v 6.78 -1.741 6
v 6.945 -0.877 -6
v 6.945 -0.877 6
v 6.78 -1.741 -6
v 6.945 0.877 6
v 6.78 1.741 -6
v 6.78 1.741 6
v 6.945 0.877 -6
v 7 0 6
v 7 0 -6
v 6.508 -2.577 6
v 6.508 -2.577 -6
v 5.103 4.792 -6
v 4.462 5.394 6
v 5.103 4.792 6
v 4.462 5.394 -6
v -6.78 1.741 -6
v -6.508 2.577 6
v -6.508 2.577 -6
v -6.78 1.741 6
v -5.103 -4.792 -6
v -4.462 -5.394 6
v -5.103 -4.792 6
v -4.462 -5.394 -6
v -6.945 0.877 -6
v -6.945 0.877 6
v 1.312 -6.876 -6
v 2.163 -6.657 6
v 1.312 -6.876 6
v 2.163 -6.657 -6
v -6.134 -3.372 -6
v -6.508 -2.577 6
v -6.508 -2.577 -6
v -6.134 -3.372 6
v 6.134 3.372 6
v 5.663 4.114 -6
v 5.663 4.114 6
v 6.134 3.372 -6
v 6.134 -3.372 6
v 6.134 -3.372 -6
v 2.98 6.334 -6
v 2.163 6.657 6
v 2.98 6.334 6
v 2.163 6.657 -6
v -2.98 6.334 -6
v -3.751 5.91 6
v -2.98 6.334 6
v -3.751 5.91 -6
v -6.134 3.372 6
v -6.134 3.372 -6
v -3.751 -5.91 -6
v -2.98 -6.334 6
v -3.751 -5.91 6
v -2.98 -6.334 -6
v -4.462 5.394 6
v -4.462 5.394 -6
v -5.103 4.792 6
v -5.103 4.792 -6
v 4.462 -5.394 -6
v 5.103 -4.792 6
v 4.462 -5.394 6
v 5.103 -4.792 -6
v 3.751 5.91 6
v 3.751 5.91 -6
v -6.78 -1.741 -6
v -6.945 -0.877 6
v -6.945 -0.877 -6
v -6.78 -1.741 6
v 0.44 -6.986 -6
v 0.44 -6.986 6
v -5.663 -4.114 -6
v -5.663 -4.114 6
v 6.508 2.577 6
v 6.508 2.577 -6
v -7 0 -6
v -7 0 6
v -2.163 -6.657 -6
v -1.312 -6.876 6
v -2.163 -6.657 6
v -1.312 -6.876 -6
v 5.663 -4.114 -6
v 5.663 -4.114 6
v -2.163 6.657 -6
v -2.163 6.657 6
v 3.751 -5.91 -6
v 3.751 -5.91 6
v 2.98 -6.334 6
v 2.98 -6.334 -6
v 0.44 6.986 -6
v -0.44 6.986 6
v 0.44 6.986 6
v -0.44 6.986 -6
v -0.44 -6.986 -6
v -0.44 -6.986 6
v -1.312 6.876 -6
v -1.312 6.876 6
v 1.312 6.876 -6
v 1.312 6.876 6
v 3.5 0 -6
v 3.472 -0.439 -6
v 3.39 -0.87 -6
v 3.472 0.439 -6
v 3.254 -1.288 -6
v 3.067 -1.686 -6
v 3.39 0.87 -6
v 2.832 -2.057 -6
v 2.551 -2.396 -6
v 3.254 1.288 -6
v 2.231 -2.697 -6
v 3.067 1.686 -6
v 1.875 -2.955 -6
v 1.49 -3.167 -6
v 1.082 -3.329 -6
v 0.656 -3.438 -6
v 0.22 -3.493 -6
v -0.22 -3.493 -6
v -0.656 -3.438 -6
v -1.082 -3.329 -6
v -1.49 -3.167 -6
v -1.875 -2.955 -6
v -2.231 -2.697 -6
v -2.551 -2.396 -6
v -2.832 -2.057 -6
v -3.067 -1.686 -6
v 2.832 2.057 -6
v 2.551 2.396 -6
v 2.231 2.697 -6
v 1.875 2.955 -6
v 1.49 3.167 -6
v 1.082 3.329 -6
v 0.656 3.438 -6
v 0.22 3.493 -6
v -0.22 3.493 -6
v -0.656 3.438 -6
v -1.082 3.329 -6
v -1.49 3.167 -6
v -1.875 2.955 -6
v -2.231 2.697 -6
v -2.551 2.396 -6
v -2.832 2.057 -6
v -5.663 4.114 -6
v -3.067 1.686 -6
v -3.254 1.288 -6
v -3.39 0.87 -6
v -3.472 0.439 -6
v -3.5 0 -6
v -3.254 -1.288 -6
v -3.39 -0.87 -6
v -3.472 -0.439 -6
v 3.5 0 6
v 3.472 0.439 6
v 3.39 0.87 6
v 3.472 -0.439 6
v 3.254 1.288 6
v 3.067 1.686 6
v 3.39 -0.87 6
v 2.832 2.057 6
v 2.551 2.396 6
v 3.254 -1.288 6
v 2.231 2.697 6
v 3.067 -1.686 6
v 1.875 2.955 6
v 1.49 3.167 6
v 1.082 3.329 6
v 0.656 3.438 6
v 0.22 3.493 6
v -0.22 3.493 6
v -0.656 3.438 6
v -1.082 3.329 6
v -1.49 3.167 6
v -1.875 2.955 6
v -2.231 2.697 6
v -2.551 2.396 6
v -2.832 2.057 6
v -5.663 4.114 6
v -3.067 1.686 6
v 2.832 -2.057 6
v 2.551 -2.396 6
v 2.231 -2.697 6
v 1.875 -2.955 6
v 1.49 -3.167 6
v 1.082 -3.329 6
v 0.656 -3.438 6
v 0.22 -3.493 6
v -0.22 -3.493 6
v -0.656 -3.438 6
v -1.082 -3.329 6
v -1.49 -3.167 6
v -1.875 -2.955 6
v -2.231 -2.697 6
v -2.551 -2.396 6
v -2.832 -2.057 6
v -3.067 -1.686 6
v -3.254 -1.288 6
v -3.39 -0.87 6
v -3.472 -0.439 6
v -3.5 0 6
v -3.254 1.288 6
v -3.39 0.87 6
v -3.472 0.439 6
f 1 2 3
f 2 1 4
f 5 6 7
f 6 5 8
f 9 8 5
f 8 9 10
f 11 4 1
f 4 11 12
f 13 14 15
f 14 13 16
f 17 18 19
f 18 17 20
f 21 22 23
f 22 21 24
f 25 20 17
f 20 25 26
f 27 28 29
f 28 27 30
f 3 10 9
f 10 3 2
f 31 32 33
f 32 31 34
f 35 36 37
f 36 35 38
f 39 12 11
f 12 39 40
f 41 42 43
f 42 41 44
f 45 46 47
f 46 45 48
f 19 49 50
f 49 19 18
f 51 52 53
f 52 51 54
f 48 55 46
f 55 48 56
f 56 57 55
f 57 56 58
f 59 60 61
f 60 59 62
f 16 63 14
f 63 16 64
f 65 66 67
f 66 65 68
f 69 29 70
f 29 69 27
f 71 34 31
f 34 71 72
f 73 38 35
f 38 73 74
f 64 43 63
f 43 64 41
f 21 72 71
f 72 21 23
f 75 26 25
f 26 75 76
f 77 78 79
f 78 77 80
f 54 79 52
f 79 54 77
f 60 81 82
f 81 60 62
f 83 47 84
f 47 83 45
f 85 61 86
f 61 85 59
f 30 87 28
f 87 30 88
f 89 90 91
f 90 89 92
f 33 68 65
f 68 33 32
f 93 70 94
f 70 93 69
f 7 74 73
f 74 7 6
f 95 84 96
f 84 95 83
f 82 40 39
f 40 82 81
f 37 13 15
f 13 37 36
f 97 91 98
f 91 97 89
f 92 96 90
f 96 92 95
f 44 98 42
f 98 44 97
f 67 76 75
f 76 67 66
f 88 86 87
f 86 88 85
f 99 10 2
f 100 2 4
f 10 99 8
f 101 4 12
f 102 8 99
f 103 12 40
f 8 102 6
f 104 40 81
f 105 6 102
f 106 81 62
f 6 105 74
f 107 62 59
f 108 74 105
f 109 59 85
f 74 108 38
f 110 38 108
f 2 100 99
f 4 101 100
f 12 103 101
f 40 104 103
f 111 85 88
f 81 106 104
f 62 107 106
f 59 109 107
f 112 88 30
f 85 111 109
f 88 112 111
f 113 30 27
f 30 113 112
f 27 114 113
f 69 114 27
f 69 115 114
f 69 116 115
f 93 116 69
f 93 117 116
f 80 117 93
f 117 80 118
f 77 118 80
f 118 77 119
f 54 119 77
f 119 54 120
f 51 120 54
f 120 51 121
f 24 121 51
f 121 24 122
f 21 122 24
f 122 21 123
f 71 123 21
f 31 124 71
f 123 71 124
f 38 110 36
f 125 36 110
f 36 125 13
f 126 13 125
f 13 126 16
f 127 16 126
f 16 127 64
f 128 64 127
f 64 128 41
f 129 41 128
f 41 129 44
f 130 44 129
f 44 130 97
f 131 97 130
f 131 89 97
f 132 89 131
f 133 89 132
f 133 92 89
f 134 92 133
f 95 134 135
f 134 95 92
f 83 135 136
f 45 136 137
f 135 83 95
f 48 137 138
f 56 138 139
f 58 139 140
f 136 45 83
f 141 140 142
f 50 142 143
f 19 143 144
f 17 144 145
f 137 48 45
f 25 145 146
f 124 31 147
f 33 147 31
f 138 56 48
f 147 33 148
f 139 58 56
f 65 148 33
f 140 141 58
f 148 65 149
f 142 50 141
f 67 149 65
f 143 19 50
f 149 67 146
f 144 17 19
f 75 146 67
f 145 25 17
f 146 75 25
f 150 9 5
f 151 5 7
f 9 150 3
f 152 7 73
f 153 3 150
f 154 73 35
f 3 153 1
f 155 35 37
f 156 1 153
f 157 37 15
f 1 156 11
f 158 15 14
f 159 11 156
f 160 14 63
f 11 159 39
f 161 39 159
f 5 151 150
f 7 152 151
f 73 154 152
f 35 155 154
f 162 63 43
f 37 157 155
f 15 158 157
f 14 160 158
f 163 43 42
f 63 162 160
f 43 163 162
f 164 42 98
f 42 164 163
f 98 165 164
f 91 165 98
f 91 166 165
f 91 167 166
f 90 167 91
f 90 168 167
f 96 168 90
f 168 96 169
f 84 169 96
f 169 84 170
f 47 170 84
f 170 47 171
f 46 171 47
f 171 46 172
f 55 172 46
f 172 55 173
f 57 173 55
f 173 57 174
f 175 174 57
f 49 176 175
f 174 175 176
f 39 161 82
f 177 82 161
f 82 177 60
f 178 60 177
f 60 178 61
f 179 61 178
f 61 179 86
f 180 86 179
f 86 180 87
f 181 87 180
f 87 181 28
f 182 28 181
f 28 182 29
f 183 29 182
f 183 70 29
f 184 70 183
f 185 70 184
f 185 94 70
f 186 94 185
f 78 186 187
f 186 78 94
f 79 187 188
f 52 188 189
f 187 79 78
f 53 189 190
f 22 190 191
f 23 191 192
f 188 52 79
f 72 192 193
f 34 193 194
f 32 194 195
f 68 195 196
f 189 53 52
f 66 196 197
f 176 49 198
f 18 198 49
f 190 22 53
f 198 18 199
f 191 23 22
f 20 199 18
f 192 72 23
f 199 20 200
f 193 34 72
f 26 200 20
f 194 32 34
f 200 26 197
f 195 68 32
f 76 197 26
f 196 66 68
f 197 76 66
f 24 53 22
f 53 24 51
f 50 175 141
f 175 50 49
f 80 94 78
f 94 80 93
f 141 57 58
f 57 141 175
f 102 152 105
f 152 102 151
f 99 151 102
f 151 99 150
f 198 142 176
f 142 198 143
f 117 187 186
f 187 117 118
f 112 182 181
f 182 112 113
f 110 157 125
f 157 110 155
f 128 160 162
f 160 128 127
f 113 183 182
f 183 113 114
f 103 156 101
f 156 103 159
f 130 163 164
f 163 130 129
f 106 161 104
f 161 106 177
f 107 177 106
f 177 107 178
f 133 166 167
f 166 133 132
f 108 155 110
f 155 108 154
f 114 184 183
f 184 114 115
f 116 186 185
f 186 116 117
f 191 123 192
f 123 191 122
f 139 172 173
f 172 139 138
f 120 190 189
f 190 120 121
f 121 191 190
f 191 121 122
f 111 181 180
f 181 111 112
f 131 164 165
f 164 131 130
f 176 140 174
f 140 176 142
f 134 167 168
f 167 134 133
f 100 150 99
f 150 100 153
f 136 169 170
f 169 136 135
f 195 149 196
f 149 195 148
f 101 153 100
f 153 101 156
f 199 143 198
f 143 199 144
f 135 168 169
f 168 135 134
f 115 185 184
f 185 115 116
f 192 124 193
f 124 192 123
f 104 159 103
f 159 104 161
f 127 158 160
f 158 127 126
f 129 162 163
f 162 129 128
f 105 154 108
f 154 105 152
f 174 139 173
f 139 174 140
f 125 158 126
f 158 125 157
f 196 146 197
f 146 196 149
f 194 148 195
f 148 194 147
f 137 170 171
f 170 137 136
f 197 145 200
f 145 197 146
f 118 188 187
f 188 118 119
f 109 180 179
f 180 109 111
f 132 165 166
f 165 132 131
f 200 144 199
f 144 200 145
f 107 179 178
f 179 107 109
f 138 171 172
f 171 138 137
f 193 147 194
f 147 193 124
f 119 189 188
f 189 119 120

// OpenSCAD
$fn = 50;


difference() {
	union() {
		translate(v = [0, 0, -6.0000000000]) {
			cylinder(h = 12, r = 7.0000000000);
		}
	}
	union() {
		translate(v = [0, 0, -100.0000000000]) {
			cylinder(h = 200, r = 3.5000000000);
		}
	}
}
